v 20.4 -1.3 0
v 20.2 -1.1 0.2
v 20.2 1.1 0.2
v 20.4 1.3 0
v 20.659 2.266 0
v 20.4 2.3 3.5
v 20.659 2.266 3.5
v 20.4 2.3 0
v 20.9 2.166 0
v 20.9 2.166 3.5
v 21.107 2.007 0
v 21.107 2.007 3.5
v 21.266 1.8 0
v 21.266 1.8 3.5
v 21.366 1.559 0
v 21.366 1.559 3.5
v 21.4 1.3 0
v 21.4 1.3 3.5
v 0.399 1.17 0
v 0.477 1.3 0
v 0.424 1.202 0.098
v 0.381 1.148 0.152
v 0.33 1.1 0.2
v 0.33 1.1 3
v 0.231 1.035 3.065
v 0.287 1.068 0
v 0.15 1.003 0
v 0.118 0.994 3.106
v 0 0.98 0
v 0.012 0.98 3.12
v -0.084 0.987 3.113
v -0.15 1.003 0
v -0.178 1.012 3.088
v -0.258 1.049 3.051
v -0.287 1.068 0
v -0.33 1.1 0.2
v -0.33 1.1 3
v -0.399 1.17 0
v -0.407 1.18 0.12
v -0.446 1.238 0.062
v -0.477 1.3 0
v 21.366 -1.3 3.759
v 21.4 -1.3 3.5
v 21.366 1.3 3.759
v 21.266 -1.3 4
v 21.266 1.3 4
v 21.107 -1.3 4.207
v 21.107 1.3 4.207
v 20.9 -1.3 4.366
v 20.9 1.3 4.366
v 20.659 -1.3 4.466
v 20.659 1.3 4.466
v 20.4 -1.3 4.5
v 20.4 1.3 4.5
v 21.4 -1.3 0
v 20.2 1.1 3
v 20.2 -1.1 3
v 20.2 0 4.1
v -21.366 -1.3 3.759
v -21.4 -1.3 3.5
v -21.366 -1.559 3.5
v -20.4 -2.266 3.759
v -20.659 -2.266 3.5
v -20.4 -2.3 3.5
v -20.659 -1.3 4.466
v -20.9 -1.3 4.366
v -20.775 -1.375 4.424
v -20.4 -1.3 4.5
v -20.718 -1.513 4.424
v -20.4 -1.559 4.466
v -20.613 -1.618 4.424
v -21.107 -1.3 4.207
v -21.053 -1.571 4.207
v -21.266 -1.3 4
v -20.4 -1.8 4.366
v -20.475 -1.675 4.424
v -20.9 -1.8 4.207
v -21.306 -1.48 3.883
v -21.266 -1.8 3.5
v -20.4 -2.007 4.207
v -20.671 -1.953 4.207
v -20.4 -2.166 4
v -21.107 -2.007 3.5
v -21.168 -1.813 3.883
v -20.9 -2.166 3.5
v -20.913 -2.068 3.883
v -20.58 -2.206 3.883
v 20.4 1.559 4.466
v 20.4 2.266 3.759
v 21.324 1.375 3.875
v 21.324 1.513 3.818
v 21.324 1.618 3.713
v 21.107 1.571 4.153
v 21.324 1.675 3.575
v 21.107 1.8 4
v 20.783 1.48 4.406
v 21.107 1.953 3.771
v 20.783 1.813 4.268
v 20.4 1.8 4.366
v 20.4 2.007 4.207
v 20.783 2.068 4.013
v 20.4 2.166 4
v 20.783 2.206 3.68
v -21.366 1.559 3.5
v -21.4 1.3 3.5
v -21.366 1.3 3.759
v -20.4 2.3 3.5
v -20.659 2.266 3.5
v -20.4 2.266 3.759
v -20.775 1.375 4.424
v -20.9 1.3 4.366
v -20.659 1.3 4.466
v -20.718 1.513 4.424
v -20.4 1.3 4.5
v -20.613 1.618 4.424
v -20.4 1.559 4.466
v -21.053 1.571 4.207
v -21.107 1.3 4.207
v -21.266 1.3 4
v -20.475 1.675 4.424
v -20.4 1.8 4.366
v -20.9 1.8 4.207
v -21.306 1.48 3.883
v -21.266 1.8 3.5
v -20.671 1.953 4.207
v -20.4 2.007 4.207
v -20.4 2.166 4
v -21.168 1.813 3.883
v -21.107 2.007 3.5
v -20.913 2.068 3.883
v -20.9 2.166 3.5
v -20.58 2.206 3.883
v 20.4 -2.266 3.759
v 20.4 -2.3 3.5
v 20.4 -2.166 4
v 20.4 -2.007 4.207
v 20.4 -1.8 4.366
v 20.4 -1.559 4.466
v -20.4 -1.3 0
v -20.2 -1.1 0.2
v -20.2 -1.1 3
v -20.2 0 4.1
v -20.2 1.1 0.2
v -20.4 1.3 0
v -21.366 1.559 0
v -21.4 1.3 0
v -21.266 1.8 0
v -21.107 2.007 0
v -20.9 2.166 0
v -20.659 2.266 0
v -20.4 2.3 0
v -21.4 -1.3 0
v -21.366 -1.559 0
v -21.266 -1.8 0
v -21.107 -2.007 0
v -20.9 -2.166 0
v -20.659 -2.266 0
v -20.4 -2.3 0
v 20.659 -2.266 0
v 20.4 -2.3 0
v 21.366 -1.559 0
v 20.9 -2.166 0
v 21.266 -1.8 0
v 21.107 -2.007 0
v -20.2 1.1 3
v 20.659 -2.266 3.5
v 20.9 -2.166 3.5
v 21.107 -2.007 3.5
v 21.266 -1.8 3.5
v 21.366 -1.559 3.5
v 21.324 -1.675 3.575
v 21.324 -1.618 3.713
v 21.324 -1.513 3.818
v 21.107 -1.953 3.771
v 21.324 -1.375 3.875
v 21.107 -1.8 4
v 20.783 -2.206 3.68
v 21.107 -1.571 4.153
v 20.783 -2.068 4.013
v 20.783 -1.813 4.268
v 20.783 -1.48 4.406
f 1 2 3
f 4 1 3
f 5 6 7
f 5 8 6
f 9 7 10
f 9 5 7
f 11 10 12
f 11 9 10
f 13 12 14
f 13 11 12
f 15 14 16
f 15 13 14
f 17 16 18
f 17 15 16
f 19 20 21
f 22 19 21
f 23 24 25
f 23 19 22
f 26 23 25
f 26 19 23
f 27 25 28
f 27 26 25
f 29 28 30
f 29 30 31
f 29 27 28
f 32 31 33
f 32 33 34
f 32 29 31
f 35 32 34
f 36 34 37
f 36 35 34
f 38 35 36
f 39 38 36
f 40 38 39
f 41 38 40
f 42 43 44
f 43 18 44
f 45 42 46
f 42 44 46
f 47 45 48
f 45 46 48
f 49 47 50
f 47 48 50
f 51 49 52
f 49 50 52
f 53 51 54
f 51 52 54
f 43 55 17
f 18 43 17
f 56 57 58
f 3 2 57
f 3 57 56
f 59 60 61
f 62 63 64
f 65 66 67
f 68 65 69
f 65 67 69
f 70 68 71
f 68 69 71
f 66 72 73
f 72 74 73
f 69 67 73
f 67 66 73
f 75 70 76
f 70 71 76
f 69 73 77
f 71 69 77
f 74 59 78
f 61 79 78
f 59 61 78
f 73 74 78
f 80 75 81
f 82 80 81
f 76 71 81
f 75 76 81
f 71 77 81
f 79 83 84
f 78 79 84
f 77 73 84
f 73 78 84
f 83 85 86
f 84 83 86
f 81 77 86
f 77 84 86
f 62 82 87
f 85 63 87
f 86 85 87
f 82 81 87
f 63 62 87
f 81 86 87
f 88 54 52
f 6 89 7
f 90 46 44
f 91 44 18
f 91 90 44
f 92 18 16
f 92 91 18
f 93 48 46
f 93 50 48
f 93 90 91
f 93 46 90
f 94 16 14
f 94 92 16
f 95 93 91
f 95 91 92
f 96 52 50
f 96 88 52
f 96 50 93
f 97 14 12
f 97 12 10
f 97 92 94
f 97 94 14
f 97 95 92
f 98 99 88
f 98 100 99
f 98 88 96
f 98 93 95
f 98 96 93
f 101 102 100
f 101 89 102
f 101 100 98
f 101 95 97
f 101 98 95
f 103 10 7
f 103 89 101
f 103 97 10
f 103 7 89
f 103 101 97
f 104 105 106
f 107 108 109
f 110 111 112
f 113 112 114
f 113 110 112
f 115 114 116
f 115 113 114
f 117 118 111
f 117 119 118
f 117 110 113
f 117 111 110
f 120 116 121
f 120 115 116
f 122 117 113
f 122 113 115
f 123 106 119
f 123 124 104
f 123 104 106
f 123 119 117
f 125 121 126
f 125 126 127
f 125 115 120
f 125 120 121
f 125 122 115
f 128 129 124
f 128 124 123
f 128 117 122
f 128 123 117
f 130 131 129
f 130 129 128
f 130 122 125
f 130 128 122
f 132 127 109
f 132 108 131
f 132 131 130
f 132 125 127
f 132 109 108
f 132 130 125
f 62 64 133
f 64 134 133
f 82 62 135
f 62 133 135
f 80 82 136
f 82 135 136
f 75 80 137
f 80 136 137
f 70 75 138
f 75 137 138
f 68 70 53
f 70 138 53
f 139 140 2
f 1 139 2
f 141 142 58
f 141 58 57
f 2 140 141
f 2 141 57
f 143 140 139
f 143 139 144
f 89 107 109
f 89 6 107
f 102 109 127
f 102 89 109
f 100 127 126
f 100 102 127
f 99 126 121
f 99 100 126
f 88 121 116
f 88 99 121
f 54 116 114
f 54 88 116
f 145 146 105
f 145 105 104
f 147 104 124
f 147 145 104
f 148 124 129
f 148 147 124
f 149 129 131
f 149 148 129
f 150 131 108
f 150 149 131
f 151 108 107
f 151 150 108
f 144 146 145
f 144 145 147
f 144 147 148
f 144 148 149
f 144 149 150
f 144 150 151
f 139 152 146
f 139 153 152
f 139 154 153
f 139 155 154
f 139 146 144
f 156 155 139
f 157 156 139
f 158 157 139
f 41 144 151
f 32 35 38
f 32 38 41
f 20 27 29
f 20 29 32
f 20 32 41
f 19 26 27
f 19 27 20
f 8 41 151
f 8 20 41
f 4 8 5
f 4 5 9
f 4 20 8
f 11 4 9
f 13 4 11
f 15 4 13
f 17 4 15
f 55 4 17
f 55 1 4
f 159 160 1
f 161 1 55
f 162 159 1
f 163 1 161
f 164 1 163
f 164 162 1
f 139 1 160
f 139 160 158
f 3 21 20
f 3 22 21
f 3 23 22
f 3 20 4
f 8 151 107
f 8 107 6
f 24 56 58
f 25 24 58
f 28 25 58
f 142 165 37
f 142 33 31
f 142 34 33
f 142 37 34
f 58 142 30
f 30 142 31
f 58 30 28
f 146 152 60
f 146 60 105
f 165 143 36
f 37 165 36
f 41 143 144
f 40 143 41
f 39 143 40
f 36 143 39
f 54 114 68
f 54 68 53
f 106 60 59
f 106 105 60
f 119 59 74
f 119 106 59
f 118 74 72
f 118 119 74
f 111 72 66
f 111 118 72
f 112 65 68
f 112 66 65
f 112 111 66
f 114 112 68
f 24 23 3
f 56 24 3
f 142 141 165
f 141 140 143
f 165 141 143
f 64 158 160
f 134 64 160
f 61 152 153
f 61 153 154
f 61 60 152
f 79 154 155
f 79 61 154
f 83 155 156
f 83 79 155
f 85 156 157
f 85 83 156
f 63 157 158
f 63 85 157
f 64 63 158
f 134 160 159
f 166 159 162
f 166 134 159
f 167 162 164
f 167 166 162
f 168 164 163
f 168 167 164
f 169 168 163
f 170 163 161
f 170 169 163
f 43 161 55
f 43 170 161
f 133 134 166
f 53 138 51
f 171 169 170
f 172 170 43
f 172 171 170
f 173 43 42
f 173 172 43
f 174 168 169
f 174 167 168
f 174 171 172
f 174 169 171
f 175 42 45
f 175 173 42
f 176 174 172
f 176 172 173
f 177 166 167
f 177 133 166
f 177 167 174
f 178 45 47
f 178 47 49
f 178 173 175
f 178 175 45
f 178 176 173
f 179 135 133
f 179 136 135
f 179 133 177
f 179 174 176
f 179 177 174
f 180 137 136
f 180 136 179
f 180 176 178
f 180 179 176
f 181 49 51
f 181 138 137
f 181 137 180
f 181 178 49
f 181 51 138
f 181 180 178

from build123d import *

# Parameters (mm, degrees)
F0_W     = 42.8
F0_H     = 4.6
F0_W_2   = 40.4
F0_H_2   = 2.2
F1_DEPTH = 3
F2_W     = 42.8
F2_H     = 4.6
F3_DEPTH = 1.5
F5_DEPTH = 40.4
F6_SIZE  = 0.2
F7_R     = 1
F9_DEPTH = 4.1197958302


with BuildPart() as f1:
    # F0 (on Top) → F1 (new body)
    with BuildSketch(Plane.XY):
        Rectangle(F0_W, F0_H)
        Rectangle(F0_W_2, F0_H_2, mode=Mode.SUBTRACT)
    extrude(amount=F1_DEPTH)

    # F2 (on face) → F3 (join)
    with BuildSketch(Plane.XY.offset(3)):
        Rectangle(F2_W, F2_H)
    extrude(amount=F3_DEPTH)

    # F4 (on face) → F5 (cut, through all)
    with BuildSketch(Plane.YZ.offset(-20.2)):
        Polygon((-1.1, 3), (1.1, 3), (0, 4.1), align=None)
    extrude(amount=F5_DEPTH, mode=Mode.SUBTRACT)

    # F6
    f6_edges = [f1.edges().sort_by_distance(p)[0] for p in [
        (0, 1.1, 0),
        (-20.2, 0, 0),
        (0, -1.1, 0),
        (20.2, 0, 0),
    ]]
    chamfer(f6_edges, length=F6_SIZE)

    # F7
    f7_edges = [f1.edges().sort_by_distance(p)[0] for p in [
        (-21.4, -2.3, 2.25),
        (-21.4, 2.3, 2.25),
        (-21.4, 0, 4.5),
        (0, 2.3, 4.5),
        (0, -2.3, 4.5),
        (21.4, -2.3, 2.25),
        (21.4, 0, 4.5),
        (21.4, 2.3, 2.25),
    ]]
    fillet(f7_edges, radius=F7_R)

    # F8 (on face) → F9 (join, up to face)
    with BuildSketch(Plane(origin=(0, 0, 0), x_dir=(1, 0, 0), z_dir=(0, 0, -1))):
        with BuildLine():
            Line((-0.4768552317, -1.3), (0.4768552317, -1.3))
            ThreePointArc((0.4768552317, -1.3), (0, -0.9802041698), (-0.4768552317, -1.3))
        make_face()
    extrude(amount=-F9_DEPTH)


solid = f1.part
